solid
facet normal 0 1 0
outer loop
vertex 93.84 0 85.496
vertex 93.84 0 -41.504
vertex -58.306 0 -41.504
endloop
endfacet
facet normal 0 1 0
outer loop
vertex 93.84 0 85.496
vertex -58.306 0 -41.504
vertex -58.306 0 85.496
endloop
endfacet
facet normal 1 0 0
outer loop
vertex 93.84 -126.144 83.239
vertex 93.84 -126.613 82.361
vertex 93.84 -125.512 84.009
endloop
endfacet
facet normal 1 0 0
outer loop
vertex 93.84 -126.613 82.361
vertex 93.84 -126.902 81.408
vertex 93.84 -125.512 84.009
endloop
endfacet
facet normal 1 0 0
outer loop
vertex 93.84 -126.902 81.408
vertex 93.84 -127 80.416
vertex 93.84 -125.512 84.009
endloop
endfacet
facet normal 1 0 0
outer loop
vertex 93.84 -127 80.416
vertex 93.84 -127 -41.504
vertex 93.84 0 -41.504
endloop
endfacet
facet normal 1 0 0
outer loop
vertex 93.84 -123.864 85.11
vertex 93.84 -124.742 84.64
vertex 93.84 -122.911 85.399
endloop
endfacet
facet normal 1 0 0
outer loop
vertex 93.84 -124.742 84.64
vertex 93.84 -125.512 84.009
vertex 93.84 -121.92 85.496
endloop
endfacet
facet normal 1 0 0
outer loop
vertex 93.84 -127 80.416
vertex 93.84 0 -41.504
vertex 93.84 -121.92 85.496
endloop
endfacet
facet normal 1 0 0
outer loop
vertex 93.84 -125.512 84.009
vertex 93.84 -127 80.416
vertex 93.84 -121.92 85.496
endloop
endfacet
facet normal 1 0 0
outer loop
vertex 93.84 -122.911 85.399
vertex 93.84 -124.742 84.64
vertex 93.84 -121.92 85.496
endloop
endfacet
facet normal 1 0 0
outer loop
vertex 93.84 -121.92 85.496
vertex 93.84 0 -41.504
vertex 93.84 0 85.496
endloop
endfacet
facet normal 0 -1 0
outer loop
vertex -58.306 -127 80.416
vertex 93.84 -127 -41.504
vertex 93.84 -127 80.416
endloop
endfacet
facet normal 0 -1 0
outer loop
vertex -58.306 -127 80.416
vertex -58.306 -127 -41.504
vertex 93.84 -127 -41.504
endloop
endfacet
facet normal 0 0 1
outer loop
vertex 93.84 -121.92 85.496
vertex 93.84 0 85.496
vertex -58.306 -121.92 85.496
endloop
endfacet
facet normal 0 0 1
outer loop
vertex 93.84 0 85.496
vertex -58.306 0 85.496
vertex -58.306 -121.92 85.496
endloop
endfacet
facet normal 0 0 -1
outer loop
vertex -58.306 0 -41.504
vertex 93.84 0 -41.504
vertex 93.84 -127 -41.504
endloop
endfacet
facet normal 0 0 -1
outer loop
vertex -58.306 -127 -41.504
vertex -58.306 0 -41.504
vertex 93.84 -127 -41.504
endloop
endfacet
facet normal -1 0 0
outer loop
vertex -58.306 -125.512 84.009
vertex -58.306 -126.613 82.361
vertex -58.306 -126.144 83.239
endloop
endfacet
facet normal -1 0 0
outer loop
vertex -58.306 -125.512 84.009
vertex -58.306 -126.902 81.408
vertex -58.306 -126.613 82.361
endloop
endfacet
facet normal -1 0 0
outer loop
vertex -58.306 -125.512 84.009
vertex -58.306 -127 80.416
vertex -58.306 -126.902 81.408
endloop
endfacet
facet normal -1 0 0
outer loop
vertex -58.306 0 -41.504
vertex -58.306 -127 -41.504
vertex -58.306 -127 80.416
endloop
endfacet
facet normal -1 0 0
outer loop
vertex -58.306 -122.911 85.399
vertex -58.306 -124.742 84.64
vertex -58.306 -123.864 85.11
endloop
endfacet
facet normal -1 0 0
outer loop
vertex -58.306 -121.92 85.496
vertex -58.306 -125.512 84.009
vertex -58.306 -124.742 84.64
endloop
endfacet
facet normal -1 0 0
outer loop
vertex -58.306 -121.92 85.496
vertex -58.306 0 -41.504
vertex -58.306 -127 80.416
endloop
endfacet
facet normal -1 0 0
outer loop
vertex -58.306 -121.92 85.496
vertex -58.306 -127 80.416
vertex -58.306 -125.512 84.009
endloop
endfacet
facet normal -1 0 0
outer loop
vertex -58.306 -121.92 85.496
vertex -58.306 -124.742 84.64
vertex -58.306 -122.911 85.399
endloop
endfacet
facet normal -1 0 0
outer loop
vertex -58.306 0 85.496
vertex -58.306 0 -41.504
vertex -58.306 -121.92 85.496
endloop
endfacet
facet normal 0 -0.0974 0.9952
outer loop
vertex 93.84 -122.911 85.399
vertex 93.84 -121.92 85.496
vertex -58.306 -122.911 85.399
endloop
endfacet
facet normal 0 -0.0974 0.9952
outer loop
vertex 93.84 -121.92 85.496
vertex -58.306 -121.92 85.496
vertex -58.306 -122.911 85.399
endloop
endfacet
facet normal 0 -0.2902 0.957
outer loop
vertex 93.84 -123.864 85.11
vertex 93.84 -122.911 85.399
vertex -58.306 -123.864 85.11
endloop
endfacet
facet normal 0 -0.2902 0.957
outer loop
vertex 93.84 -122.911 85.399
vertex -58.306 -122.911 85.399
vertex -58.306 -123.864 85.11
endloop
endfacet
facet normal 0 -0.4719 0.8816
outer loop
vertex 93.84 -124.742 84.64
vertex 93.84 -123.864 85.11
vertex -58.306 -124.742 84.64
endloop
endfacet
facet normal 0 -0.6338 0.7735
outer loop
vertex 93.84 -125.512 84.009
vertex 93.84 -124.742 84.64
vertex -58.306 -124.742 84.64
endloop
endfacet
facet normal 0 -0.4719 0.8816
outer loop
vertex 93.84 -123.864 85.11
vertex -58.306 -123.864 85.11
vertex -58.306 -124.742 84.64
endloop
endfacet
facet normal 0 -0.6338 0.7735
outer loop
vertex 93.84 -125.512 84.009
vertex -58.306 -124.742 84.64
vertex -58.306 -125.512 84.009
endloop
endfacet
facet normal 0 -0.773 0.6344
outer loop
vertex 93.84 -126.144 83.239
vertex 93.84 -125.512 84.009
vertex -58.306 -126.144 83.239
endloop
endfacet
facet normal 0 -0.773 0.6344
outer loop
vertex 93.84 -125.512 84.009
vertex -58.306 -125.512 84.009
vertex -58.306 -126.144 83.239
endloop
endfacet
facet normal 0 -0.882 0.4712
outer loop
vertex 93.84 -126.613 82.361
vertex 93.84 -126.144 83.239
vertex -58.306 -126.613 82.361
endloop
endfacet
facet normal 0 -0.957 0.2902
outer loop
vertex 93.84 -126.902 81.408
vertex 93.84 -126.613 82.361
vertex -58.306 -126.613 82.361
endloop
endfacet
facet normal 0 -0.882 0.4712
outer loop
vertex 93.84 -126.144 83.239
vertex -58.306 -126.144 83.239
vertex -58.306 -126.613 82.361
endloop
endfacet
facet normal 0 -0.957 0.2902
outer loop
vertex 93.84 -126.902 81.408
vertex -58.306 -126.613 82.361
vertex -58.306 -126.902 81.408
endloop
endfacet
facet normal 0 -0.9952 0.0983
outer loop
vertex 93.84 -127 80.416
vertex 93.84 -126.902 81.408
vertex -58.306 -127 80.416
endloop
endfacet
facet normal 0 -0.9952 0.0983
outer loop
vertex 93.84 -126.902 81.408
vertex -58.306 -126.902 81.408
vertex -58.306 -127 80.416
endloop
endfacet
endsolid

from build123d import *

# Parameters (mm, degrees)
F0_W     = 127
F0_H     = 127
F1_DEPTH = 127
F2_DEPTH = 25.146
F3_R     = 5.08


with BuildPart() as f1:
    # F0 (on Front) → F1 (new body)
    with BuildSketch(Plane.XZ):
        with Locations((5.1937198043, 21.9964998066)):
            Rectangle(F0_W, F0_H)
    extrude(amount=F1_DEPTH)

    # F2 (add): a face of the model
    f2_faces = [f1.faces().sort_by_distance(p)[0] for p in [
        (68.6937198043, -63.5, 21.9964998066),
    ]]
    extrude(f2_faces, amount=F2_DEPTH)

    # F3
    f3_edges = [f1.edges().sort_by_distance(p)[0] for p in [
        (17.76672, -127, 85.4965),
    ]]
    fillet(f3_edges, radius=F3_R)


solid = f1.part
